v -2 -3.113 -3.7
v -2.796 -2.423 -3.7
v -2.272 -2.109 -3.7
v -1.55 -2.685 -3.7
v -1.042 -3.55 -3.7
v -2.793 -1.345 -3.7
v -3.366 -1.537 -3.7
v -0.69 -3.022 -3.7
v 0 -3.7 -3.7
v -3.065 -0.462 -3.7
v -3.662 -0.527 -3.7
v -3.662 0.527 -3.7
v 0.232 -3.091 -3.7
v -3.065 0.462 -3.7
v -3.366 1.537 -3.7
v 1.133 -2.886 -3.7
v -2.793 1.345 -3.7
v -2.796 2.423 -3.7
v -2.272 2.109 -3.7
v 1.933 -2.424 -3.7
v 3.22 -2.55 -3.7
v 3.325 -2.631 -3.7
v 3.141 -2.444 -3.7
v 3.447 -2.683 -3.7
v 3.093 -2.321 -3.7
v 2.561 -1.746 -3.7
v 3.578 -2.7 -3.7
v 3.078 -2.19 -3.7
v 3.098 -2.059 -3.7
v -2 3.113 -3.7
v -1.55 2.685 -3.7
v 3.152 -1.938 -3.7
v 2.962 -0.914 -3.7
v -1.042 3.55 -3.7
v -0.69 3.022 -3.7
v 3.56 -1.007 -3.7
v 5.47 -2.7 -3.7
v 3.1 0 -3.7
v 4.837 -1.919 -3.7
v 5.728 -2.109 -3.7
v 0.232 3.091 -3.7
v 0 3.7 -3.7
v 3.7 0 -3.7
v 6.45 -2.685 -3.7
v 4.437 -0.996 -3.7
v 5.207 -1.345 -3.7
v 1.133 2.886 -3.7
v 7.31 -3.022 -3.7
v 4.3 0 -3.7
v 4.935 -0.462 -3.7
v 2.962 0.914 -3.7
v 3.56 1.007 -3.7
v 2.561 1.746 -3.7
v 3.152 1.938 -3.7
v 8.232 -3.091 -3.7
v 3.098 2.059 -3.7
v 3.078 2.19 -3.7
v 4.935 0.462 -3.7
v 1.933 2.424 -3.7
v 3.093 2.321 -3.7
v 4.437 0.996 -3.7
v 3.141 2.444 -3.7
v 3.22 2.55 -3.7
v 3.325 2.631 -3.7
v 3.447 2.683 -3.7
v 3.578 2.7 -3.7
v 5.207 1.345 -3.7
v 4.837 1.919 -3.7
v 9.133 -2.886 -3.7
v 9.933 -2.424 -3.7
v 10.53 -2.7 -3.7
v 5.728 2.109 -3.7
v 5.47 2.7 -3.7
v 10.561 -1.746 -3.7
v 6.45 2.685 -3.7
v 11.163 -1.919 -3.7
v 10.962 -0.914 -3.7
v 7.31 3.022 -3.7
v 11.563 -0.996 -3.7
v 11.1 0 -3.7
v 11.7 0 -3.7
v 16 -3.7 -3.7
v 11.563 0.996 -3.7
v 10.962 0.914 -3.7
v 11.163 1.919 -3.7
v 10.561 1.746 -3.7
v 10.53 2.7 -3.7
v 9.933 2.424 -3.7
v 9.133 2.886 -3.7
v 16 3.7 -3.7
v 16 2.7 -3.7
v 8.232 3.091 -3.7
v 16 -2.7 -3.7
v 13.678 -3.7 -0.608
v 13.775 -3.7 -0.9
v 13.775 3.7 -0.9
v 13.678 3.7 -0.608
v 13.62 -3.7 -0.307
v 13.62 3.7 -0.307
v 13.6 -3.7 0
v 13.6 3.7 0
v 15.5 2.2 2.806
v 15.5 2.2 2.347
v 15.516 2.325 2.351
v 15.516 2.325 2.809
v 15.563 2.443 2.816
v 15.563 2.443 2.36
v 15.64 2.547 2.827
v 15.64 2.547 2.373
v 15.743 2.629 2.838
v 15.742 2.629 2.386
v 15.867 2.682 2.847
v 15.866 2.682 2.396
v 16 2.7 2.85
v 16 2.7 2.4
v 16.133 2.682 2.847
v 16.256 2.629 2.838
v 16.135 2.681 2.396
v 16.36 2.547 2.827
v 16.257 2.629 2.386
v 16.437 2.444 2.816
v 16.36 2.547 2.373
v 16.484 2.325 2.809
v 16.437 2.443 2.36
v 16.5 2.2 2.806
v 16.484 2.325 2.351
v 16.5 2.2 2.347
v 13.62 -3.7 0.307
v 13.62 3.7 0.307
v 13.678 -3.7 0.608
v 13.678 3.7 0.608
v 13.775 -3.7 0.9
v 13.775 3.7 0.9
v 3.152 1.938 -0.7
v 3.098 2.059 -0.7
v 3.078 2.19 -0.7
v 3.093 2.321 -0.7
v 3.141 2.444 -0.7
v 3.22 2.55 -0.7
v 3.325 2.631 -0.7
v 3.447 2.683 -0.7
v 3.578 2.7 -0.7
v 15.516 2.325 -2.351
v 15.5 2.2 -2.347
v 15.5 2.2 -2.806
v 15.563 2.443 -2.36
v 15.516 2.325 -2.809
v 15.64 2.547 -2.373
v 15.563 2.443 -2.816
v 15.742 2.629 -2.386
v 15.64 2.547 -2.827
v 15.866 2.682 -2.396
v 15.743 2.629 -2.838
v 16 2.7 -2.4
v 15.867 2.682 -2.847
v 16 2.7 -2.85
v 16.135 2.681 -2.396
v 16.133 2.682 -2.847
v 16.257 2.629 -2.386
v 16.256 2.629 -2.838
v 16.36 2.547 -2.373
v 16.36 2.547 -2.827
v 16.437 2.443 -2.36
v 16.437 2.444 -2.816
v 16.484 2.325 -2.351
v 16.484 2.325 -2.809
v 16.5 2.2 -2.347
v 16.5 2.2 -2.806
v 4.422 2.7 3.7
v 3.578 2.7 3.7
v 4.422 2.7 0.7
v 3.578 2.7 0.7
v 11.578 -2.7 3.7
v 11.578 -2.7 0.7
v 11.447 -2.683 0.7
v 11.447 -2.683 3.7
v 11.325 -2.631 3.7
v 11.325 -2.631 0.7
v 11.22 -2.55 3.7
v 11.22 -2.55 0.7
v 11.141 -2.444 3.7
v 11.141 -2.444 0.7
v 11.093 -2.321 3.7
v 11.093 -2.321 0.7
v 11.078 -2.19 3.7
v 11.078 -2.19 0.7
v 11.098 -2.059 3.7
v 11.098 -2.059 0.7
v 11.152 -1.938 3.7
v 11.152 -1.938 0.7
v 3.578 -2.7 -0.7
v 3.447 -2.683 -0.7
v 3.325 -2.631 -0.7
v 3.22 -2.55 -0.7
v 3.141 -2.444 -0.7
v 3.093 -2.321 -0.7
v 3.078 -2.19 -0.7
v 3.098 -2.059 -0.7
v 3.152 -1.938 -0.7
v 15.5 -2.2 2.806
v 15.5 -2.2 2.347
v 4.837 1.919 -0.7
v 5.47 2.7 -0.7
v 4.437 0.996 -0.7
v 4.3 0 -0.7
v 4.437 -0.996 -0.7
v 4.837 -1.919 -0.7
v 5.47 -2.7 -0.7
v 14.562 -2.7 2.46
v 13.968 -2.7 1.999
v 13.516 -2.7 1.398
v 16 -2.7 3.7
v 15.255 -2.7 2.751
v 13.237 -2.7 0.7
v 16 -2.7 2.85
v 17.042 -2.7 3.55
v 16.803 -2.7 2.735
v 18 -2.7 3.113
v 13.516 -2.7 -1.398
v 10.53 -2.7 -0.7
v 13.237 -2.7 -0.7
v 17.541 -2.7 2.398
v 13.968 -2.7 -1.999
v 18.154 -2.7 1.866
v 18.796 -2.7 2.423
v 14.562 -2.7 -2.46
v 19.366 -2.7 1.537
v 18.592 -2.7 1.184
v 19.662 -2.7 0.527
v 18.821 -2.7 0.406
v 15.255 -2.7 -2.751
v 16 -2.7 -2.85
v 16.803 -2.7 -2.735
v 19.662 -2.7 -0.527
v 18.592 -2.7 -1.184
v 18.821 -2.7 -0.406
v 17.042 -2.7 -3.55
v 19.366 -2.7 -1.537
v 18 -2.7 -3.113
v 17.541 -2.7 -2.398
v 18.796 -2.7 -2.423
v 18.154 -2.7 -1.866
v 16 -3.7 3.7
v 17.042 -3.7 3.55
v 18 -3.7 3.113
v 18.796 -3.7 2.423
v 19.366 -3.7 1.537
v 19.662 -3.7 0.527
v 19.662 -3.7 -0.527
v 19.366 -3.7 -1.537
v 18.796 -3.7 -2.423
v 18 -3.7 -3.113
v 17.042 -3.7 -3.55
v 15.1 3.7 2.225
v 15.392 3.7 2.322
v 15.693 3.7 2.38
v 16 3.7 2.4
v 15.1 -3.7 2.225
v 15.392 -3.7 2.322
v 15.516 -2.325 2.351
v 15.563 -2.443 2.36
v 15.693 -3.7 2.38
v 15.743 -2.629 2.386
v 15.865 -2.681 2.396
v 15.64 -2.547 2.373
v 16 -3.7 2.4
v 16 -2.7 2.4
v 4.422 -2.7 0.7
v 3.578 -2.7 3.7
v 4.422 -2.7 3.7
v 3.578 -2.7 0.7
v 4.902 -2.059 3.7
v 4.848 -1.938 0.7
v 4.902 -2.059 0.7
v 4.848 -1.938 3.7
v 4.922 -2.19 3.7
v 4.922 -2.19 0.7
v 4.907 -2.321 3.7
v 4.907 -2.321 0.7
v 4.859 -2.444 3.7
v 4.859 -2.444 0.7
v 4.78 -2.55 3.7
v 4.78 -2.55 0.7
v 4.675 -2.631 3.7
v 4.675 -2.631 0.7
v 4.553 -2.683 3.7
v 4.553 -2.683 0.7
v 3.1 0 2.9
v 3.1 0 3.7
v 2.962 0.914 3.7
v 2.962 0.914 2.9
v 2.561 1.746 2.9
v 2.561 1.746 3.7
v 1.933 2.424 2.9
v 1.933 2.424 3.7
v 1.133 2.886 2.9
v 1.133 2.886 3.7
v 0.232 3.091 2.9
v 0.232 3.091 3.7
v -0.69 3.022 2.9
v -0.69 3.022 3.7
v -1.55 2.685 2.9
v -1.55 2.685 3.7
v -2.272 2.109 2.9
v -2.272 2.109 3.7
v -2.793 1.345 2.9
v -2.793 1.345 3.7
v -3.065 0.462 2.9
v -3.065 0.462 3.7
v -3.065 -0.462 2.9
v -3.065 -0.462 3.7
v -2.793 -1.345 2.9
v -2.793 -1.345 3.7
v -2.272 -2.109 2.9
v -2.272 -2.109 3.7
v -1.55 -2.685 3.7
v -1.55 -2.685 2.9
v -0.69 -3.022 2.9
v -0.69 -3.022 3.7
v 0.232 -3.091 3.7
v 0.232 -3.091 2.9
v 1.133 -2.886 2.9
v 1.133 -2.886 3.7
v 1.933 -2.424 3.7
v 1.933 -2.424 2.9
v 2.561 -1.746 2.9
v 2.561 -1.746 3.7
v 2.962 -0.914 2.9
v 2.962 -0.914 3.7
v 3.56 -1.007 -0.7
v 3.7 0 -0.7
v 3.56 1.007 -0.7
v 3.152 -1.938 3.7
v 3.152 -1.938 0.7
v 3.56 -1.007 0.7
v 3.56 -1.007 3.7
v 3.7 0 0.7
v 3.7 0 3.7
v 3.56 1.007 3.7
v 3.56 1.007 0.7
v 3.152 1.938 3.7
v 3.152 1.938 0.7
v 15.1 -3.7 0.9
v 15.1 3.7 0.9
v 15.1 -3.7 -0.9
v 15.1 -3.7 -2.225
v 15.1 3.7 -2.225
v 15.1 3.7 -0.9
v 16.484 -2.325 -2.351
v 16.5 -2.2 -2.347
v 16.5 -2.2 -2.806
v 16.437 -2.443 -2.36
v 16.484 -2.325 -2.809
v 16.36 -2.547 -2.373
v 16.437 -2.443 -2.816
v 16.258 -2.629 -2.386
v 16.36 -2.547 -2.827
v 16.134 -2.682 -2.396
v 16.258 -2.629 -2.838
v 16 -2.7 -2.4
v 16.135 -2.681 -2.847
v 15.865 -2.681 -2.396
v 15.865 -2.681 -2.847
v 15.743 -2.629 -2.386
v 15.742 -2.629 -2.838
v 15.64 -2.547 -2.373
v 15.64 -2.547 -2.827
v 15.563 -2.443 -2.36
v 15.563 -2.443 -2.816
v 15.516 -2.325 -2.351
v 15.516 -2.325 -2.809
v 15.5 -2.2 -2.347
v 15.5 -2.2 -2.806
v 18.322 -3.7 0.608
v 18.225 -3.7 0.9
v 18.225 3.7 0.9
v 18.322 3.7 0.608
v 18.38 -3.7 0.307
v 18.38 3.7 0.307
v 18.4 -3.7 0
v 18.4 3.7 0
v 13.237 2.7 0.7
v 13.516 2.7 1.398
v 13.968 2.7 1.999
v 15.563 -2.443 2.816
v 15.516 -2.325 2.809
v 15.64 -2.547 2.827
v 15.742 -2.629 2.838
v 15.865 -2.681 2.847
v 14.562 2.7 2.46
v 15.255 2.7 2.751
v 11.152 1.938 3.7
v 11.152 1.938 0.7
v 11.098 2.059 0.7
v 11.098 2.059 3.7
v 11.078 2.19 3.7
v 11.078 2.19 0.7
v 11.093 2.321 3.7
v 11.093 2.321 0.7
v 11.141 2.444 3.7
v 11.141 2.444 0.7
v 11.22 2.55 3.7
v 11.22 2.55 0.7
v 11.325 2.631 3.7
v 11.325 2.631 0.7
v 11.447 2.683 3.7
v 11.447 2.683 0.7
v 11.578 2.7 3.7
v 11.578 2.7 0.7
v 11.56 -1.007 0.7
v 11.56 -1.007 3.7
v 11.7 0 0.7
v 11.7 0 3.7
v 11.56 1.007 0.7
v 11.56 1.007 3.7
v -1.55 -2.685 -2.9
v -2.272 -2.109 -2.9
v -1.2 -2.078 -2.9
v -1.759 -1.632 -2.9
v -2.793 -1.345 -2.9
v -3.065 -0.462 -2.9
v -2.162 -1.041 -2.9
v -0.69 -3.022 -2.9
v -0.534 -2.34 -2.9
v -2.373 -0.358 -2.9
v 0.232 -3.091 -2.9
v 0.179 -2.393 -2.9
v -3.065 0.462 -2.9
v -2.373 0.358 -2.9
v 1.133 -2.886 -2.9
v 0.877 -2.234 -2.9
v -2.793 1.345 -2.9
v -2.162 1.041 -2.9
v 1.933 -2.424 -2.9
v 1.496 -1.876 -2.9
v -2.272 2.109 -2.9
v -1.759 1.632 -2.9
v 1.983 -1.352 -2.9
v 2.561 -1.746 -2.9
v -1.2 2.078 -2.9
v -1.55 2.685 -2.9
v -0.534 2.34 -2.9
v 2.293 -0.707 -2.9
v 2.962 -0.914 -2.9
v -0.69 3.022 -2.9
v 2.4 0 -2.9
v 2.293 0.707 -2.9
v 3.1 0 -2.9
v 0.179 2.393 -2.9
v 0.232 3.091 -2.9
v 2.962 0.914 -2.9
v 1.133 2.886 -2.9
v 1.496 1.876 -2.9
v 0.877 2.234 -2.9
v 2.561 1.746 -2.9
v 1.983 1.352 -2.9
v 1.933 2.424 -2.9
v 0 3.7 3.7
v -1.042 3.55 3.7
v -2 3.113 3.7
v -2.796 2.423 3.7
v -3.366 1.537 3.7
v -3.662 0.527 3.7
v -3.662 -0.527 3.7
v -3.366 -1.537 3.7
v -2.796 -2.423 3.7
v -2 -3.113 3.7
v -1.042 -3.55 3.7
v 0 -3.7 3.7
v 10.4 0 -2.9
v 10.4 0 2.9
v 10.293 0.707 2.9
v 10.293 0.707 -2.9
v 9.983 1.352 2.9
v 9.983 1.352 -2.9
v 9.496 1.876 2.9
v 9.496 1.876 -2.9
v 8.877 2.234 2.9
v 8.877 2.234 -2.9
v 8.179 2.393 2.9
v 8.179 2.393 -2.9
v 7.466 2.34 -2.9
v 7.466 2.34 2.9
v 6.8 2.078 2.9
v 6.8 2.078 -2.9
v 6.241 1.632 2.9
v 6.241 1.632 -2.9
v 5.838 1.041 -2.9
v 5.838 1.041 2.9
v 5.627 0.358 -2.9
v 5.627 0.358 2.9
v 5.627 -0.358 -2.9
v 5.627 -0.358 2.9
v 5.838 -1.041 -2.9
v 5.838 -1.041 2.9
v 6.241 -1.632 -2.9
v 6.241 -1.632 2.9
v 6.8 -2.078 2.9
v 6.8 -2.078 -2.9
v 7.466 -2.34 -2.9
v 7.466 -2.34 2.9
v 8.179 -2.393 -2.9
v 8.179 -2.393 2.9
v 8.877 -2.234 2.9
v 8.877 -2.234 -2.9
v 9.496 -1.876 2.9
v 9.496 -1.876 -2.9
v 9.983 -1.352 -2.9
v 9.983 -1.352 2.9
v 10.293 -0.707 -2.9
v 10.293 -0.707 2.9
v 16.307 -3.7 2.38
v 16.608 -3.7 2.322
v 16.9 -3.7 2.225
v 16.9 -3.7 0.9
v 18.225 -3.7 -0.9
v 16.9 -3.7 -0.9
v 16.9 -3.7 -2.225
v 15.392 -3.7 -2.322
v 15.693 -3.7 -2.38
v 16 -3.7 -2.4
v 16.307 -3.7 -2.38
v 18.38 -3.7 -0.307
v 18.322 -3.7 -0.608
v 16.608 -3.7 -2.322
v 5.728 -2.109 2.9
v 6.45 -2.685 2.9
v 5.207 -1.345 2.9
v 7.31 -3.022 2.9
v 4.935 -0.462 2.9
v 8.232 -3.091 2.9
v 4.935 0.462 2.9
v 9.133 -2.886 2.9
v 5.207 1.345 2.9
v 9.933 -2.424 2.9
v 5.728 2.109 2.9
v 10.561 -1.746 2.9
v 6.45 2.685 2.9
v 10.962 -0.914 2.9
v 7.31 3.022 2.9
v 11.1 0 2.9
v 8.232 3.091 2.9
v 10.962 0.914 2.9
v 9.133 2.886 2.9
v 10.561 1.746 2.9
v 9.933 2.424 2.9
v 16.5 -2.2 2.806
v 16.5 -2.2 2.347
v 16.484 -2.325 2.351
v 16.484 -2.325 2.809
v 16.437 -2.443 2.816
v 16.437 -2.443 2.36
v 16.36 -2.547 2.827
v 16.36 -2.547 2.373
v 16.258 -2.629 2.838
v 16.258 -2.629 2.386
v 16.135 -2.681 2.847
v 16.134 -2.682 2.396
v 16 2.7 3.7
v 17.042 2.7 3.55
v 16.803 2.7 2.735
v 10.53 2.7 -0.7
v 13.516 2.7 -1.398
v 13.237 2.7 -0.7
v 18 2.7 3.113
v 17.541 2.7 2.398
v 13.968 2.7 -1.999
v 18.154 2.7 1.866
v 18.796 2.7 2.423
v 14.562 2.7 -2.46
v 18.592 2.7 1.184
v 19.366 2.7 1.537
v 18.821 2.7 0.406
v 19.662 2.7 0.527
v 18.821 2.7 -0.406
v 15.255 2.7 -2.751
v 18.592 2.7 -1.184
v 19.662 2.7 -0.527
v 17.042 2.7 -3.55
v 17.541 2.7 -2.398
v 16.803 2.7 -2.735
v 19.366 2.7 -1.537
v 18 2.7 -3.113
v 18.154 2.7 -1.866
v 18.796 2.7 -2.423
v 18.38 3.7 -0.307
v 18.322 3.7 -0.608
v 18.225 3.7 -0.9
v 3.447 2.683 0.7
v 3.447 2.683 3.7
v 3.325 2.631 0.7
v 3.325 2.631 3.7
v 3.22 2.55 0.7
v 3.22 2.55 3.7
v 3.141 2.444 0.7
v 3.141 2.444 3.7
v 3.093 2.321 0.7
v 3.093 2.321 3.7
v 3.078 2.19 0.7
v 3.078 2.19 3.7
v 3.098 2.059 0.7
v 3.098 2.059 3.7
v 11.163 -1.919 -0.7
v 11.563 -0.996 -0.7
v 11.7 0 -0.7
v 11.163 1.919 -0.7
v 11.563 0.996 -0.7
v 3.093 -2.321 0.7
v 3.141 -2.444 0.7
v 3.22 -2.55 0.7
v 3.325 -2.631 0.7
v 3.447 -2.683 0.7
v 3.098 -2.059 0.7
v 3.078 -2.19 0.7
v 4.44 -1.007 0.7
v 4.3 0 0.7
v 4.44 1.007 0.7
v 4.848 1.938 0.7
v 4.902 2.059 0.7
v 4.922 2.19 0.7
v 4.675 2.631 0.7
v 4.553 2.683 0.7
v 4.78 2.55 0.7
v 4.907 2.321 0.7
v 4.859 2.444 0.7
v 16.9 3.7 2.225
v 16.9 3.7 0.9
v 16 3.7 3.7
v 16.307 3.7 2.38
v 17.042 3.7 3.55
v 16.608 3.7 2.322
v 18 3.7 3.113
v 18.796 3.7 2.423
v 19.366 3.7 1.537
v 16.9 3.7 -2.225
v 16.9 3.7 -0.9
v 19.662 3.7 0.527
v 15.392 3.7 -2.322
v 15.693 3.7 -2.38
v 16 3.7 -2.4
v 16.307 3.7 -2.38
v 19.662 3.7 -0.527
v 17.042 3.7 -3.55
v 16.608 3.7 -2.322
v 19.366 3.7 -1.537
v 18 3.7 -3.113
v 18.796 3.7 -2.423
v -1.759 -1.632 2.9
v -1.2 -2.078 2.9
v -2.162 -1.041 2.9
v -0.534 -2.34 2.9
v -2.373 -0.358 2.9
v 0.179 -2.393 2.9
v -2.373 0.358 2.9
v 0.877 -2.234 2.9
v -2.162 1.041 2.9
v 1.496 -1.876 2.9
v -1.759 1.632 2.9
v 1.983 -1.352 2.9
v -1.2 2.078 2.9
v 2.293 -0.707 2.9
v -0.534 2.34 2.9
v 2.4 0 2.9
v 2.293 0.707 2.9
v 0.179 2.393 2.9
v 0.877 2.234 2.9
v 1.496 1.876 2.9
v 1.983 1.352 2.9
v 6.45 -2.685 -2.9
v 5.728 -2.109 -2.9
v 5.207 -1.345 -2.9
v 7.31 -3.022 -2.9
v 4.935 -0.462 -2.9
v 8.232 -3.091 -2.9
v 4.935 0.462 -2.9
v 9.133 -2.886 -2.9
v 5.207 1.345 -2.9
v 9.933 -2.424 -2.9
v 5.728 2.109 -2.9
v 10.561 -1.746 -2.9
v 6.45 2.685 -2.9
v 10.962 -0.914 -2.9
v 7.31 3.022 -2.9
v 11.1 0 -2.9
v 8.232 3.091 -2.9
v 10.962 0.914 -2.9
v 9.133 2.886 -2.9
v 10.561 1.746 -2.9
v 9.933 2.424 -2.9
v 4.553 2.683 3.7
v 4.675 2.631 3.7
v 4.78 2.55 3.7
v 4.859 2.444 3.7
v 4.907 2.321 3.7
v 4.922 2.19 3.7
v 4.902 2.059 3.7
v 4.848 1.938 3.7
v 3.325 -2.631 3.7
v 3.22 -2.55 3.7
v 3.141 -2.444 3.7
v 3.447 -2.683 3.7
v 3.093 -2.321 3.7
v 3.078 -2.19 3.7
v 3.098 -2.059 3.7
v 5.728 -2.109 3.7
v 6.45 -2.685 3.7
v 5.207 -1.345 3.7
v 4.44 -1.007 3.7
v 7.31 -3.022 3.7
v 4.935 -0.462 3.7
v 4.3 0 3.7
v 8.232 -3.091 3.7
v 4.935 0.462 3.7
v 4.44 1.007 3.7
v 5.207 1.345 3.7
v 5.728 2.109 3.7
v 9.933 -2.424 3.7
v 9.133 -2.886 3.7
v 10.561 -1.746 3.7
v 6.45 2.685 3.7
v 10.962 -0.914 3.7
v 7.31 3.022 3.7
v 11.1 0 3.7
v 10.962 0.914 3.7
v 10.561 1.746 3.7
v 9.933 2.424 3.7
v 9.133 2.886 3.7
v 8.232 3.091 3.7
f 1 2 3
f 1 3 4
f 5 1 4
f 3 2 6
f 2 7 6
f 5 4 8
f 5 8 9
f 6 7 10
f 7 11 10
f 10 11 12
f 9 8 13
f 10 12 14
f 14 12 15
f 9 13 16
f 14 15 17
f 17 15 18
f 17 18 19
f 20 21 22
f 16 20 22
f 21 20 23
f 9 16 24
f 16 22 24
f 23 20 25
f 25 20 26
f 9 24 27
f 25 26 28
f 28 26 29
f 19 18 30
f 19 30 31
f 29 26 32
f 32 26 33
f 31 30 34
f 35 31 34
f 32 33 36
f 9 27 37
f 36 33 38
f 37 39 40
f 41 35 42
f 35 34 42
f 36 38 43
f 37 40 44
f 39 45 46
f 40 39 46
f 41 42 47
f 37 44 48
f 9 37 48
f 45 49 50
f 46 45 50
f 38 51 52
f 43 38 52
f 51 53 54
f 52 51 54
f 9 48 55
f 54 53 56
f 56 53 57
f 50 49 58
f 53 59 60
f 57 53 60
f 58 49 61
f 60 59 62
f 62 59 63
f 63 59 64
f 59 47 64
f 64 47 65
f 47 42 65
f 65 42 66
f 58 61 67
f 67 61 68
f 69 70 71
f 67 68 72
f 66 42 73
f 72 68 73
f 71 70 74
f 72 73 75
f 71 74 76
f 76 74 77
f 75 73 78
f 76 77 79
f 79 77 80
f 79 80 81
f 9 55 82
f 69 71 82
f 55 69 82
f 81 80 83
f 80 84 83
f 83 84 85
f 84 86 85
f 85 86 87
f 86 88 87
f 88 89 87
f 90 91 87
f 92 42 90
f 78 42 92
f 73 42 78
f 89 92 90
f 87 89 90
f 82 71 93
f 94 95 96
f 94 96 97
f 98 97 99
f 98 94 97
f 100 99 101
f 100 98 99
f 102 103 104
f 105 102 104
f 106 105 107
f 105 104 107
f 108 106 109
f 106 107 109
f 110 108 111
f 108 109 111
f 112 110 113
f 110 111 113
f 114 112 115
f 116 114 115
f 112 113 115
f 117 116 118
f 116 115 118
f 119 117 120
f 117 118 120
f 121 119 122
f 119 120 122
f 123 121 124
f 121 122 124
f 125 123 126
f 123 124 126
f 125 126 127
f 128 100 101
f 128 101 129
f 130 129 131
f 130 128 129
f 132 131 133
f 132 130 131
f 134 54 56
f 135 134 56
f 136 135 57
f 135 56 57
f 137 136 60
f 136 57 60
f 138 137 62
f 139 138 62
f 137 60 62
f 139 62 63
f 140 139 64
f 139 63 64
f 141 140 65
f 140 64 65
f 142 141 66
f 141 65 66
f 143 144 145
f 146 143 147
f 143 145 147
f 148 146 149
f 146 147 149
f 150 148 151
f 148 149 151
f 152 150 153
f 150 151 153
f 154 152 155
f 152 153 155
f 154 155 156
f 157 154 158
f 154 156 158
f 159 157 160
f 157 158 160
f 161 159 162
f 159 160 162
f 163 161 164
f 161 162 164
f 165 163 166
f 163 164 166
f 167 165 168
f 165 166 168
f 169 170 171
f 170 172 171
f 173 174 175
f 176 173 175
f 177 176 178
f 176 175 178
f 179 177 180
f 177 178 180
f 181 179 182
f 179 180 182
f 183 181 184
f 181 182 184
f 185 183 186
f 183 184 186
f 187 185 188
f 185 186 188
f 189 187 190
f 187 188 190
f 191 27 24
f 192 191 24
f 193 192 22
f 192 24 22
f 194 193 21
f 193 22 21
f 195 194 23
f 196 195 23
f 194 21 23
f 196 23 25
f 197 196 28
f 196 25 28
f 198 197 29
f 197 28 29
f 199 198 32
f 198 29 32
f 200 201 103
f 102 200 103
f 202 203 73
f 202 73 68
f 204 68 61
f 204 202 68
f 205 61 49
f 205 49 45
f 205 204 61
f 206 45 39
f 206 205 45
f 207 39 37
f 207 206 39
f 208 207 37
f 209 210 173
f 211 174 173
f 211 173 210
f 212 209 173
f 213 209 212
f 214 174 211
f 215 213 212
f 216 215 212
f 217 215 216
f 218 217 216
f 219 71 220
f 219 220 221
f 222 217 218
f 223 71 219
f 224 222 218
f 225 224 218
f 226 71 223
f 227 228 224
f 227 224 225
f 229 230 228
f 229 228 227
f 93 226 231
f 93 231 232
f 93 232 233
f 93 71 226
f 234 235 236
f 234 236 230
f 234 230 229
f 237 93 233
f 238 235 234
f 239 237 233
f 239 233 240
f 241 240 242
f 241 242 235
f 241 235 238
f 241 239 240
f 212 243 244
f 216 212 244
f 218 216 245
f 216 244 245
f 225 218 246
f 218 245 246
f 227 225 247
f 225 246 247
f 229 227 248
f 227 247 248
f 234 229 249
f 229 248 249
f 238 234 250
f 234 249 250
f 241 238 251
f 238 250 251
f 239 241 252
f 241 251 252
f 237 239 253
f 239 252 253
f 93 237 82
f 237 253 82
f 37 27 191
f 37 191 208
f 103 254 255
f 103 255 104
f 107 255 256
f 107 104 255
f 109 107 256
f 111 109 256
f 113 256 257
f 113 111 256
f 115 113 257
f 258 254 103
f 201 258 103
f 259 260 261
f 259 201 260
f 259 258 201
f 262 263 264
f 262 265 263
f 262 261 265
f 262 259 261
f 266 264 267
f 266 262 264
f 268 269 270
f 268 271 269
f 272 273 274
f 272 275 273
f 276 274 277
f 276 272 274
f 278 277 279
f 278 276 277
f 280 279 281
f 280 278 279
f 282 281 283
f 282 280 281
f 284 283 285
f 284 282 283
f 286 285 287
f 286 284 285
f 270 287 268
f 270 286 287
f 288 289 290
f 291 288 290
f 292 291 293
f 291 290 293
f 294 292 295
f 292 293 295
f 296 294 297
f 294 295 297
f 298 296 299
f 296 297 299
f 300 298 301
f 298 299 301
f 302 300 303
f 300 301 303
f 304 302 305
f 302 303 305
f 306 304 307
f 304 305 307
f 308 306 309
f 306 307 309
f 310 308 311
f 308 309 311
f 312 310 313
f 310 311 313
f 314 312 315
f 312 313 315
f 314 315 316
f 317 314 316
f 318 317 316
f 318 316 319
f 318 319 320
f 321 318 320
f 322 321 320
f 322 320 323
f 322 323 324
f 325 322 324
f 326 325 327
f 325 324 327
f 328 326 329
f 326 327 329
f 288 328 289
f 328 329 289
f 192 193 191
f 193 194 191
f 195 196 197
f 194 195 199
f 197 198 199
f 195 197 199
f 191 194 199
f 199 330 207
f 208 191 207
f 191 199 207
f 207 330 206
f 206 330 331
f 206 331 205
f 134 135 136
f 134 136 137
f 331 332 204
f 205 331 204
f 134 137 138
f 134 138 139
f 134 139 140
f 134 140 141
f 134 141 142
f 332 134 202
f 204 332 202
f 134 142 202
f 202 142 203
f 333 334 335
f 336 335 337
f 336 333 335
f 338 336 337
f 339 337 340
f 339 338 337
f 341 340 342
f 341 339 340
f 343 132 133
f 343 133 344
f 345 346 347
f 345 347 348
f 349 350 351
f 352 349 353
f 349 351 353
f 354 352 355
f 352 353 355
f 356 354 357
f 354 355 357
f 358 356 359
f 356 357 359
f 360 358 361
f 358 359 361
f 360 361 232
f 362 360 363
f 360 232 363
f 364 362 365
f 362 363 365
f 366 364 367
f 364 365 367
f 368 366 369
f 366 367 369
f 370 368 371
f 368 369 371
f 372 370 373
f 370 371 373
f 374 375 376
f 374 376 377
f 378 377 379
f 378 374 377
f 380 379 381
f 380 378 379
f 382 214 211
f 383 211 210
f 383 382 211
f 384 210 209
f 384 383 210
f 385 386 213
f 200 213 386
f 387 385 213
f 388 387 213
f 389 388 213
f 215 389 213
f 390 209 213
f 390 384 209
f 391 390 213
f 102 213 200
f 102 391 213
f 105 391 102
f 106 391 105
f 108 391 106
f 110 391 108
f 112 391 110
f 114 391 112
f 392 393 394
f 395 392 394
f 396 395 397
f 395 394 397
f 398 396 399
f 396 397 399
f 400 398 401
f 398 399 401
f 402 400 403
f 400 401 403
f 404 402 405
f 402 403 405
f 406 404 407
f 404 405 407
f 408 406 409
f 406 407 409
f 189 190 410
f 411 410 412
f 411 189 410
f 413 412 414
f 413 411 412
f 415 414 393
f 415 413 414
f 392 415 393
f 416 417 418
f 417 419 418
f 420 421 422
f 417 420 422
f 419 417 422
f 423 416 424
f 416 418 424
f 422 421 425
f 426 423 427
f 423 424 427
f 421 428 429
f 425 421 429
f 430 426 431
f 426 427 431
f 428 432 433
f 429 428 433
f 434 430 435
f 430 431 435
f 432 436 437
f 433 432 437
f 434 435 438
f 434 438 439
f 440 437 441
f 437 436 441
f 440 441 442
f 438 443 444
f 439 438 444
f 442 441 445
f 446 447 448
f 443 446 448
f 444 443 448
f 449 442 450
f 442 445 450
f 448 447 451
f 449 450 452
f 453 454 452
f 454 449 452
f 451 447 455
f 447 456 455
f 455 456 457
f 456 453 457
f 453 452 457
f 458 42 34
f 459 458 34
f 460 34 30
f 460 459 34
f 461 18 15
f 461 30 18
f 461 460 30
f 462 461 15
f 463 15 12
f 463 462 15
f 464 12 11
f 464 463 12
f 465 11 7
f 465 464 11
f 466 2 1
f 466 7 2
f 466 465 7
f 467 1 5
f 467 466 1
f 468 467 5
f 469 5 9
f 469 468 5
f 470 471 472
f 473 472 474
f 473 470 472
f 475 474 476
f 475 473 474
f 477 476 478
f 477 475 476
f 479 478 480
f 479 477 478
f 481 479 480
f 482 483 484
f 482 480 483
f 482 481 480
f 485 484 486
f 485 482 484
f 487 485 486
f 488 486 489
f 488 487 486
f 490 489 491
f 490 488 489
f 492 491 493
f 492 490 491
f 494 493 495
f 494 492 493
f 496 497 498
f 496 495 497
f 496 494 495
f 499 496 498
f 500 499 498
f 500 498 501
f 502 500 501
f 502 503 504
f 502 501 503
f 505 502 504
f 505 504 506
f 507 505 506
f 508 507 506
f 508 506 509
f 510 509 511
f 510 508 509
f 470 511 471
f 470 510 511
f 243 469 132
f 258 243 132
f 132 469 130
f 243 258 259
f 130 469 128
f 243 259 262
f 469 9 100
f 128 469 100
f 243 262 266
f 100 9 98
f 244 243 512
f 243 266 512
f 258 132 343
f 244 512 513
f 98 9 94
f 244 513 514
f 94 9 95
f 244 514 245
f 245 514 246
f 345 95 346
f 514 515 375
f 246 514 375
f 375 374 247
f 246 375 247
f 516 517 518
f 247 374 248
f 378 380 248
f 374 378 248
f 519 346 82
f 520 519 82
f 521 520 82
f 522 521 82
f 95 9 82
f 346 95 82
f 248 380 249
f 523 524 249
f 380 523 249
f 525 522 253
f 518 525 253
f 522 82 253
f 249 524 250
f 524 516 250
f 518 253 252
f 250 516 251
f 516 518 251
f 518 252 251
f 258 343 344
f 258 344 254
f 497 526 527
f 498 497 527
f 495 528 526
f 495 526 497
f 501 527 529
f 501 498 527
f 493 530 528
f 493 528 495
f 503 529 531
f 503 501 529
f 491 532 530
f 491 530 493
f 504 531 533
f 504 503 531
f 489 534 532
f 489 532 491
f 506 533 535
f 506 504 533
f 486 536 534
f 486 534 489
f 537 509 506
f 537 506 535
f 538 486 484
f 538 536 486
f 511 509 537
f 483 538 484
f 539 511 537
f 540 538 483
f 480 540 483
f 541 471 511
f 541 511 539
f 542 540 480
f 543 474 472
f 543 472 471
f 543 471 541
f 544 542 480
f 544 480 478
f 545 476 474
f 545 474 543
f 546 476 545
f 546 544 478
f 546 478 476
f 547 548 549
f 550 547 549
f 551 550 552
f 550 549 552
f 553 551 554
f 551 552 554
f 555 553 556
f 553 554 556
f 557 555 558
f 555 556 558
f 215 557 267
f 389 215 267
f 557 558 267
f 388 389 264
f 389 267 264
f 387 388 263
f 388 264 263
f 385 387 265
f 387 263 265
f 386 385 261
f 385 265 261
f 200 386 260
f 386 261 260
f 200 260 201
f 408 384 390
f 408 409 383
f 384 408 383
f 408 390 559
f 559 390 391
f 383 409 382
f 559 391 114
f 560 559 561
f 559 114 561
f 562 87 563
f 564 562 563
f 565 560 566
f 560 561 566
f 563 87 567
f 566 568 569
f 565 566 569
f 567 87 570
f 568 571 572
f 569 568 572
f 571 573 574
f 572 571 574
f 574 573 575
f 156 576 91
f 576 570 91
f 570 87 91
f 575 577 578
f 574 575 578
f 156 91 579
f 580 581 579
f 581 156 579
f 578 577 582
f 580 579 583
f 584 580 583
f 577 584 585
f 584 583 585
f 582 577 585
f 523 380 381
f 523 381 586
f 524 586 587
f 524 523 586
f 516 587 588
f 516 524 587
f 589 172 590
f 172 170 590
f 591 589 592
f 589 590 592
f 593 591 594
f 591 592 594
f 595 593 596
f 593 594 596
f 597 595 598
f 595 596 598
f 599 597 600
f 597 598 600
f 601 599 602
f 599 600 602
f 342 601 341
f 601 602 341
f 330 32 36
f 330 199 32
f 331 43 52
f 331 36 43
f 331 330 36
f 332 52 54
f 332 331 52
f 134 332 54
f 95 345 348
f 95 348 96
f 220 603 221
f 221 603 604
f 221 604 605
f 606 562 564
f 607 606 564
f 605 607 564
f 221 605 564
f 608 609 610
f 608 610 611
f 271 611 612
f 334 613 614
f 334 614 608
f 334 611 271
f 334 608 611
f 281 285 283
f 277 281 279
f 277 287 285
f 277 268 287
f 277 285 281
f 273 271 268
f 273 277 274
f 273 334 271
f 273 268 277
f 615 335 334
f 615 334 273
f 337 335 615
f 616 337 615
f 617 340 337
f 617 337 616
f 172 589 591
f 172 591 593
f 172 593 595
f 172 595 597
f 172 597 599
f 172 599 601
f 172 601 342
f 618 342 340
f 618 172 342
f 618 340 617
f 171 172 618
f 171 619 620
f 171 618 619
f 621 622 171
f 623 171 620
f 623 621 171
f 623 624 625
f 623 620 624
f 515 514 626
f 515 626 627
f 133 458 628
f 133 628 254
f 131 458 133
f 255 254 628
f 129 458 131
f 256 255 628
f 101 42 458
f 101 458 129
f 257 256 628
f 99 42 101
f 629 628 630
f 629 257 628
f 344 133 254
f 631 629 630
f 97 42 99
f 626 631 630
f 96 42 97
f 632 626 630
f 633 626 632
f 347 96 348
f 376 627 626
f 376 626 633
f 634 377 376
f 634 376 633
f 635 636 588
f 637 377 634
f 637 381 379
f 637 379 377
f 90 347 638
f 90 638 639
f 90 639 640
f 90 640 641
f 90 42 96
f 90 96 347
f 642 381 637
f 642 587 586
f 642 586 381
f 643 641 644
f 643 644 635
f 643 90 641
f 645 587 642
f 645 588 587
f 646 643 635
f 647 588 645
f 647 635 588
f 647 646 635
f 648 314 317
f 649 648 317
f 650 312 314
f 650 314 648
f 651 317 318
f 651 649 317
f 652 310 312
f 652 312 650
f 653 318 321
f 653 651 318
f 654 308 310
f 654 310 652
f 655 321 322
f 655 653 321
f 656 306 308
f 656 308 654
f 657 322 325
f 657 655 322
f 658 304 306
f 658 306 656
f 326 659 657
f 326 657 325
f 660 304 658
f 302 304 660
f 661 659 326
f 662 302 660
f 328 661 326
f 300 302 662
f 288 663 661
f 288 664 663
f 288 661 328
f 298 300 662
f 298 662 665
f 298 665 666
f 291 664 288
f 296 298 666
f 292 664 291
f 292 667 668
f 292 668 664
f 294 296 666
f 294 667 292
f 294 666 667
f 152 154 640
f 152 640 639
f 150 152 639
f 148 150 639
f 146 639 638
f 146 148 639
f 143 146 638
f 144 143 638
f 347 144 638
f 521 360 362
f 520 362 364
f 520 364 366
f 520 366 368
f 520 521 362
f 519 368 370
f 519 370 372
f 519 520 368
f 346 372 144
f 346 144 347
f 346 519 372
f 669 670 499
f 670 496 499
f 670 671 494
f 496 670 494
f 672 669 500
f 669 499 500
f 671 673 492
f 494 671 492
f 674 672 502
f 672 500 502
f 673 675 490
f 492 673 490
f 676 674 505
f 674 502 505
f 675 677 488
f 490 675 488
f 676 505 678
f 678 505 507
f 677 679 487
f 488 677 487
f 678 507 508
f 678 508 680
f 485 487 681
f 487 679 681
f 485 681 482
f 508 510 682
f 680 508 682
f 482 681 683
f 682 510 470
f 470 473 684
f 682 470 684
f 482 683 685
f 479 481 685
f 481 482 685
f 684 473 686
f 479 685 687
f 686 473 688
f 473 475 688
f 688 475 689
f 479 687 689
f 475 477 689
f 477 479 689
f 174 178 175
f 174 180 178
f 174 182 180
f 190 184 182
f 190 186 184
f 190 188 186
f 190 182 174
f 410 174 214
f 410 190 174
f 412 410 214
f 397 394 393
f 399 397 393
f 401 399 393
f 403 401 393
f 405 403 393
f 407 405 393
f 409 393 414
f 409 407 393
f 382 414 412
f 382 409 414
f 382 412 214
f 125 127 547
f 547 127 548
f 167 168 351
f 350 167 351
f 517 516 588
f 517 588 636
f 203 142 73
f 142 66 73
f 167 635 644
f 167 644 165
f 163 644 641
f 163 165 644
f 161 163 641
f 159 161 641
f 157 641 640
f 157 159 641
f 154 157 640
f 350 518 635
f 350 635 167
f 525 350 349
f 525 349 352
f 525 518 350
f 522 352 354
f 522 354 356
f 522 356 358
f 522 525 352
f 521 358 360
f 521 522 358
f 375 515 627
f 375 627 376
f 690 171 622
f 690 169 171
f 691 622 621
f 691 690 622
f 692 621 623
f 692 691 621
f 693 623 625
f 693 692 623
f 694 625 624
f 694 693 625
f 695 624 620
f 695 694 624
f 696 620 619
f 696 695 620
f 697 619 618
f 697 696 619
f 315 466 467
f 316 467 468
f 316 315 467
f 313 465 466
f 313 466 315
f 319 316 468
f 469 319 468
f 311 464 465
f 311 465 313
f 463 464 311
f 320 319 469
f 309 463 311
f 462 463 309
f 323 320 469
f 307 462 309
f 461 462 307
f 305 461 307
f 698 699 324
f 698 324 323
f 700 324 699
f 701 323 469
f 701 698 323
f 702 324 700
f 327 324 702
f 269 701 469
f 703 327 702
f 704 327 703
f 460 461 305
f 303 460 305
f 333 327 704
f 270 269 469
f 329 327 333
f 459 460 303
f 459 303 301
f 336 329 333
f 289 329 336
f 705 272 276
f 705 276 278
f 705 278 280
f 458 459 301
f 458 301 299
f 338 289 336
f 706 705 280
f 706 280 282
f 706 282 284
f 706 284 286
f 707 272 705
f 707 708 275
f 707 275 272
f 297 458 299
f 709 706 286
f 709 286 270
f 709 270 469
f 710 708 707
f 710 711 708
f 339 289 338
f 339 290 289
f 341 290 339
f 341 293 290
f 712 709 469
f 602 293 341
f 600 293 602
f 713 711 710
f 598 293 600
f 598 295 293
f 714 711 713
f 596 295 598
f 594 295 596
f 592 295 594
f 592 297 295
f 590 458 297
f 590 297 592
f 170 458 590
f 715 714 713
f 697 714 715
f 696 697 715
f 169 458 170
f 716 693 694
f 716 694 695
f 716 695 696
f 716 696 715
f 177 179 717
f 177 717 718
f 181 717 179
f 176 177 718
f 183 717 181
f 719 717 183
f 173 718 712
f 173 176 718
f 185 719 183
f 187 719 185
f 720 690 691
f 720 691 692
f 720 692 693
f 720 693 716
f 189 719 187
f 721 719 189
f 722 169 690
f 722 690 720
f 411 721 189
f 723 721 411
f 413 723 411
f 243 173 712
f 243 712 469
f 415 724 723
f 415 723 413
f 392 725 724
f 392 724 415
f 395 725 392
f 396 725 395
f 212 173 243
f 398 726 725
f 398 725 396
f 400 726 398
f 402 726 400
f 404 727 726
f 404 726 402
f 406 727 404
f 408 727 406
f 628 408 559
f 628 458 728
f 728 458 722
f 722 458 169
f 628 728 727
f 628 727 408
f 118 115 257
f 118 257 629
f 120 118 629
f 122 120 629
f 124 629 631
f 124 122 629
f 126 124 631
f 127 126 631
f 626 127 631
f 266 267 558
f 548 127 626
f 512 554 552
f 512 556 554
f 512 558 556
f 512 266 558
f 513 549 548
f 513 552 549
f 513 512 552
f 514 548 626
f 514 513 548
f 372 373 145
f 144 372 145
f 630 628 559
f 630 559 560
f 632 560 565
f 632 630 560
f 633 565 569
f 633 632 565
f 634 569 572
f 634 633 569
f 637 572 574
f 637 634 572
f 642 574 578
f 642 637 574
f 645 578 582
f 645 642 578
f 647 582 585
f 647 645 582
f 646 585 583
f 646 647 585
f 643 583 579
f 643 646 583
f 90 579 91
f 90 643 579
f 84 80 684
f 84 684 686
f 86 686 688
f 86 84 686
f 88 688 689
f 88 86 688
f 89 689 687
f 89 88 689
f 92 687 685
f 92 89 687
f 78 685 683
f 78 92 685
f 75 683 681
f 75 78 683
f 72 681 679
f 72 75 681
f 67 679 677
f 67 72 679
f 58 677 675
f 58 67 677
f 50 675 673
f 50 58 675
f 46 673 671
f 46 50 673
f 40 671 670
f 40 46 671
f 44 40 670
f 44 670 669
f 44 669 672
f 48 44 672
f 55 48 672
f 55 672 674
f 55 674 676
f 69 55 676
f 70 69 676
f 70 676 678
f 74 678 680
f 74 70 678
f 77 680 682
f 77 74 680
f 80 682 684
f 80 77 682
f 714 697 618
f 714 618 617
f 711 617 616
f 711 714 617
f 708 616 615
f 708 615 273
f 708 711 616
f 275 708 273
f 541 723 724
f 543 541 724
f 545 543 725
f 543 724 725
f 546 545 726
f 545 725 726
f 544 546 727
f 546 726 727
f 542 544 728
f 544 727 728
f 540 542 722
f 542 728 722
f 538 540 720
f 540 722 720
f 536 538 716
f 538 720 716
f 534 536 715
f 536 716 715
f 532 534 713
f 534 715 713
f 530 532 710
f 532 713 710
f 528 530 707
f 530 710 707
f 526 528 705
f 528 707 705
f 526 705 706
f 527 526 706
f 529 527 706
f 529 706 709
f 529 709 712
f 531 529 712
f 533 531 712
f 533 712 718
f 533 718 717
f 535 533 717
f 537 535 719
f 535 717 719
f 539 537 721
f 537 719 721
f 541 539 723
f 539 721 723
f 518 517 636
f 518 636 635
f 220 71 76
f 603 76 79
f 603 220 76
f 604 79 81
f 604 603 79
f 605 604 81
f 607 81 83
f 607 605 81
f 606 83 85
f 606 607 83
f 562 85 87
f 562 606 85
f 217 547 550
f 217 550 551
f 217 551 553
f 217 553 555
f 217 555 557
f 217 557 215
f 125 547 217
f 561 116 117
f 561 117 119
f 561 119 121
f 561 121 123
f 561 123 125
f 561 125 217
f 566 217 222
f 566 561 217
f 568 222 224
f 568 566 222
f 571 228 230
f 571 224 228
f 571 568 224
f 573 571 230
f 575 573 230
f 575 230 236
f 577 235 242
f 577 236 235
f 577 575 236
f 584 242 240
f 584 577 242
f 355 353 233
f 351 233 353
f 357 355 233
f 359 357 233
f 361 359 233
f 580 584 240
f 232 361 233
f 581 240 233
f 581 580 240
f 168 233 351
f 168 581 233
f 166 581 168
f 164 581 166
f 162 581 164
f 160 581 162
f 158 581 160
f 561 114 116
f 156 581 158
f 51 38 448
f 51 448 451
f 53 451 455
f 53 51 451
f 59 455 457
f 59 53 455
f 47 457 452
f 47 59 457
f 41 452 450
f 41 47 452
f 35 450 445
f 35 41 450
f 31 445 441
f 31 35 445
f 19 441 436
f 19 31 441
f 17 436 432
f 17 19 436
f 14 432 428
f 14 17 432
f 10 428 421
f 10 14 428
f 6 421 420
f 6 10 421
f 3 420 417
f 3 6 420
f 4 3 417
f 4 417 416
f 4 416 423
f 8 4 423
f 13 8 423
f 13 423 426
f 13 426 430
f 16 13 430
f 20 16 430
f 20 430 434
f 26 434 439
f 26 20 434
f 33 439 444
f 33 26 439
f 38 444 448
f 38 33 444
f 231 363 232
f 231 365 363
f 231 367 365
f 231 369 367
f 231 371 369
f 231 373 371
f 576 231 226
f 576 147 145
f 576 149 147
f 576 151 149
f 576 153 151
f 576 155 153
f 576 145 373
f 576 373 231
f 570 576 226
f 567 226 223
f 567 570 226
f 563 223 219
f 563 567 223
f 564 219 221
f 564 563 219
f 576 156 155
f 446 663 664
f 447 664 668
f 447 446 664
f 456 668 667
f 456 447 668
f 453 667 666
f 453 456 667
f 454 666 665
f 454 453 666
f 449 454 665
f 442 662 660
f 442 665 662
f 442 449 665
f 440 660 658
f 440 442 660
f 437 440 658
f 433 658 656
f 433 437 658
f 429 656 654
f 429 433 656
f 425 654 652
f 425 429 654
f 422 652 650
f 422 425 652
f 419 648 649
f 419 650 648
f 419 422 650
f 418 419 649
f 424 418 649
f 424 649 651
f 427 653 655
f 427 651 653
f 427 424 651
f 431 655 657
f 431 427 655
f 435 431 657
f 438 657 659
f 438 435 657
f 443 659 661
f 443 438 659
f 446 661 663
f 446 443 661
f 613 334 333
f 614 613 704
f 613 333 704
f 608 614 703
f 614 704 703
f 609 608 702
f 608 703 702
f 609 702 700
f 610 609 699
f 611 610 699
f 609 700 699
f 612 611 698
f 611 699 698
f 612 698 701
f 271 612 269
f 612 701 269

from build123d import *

# Parameters (mm, degrees)
SKETCH1_R                  = 3.7
SKETCH1_R_2                = 2.4
PIN_SIDE_DEPTH             = 3.7
SIDE_START                 = 3.7
SIDE_EAR_DEPTH             = 1
MIDDLE_RIB_DEPTH           = 0.7
SKETCH4_R                  = 2.85
AXLE_BODY_DEPTH            = 3.7
AXLE_CUT_DEPTH             = 21.383081219
AXLE_CUT_DEPTH_BACK        = 21.383081219
SKETCH5_W                  = 1.8
SKETCH5_H                  = 1.8
AXLE_SLOT_DEPTH            = 21.383081219
AXLE_SLOT_DEPTH_BACK       = 21.383081219
SKETCH8_R                  = 3.7
SKETCH8_R_2                = 2.4
SECOND_PIN_BODY_DEPTH      = 3.7
SECOND_PIN_HOLE_DEPTH      = 21.383081238
SECOND_PIN_HOLE_DEPTH_BACK = 21.383081238
SKETCH9_R                  = 2.4
SKETCH7_R                  = 3.1
PIN_RIM_DEPTH              = 0.8
FILLET1_R                  = 0.5
MIRROR2_START              = -3.7
MIRROR2_OUTLINE_R          = 3.1
MIRROR2_OUTLINE_R_2        = 2.4
MIRROR2_DEPTH              = 0.8
MIRROR2_2_DEPTH            = 3
MIRROR2_START_2            = 0.7
MIRROR2_3_DEPTH            = 3


# Read off the part's stored shape, not the designer's step: Mirror2
with BuildPart() as part:
    # Sketch1 → Pin Side (new, symmetric)
    with BuildSketch(Plane.XY):
        Circle(SKETCH1_R)
        Circle(SKETCH1_R_2, mode=Mode.SUBTRACT)
    extrude(amount=PIN_SIDE_DEPTH, both=True)

    # Sketch2 → Side Ear (add)
    with BuildSketch(Plane(origin=(0, 0, 0), x_dir=(1, 0, 0), z_dir=(0, 1, 0)).offset(SIDE_START)):
        with BuildLine():
            Line((0, 3.7), (0, -3.7))
            Line((0, -3.7), (16, -3.7))
            ThreePointArc((16, -3.7), (19.7, 0), (16, 3.7))
            Line((16, 3.7), (0, 3.7))
        make_face()
    side_ear = extrude(amount=-SIDE_EAR_DEPTH)

    # Mirror1: Side Ear across plane
    add(side_ear.mirror(Plane.ZX))

    # Sketch3 → Middle Rib (add, symmetric)
    with BuildSketch(Plane.XY):
        with BuildLine():
            Line((2.529822128, -2.7), (16, -2.7))
            Line((16, -2.7), (16, 2.7))
            Line((16, 2.7), (2.529822128, 2.7))
            ThreePointArc((2.529822128, 2.7), (3.7, 0), (2.529822128, -2.7))
        make_face()
    extrude(amount=MIDDLE_RIB_DEPTH, both=True)

    # Sketch4 → Axle Body (add, symmetric)
    with BuildSketch(Plane(origin=(0, 0, 0), x_dir=(1, 0, 0), z_dir=(0, 1, 0))):
        with Locations((16, 0)):
            Circle(SKETCH4_R)
    extrude(amount=AXLE_BODY_DEPTH, both=True)

    # Sketch5 → Axle Cut (cut, two sides: drawn at the far end of the back side and taken through both)
    with BuildSketch(Plane(origin=(0, 0, 0), x_dir=(1, 0, 0), z_dir=(0, 1, 0)).offset(-AXLE_CUT_DEPTH_BACK)):
        with BuildLine():
            Line((13.775140454, -0.9), (15.1, -0.9))
            Line((15.1, -0.9), (15.1, 0.9))
            Line((15.1, 0.9), (13.775140454, 0.9))
            ThreePointArc((13.775140454, 0.9), (13.644191974, 0.45844143), (13.6, 0))
            ThreePointArc((13.6, 0), (13.644191974, -0.45844143), (13.775140454, -0.9))
        make_face()
        with BuildLine():
            Line((15.1, 0.9), (16.9, 0.9))
            Line((16.9, 0.9), (16.9, 2.224859546))
            ThreePointArc((16.9, 2.224859546), (16.45844143, 2.355808026), (16, 2.4))
            ThreePointArc((16, 2.4), (15.54155857, 2.355808026), (15.1, 2.224859546))
            Line((15.1, 2.224859546), (15.1, 0.9))
        make_face()
        with Locations((16, 0)):
            Rectangle(SKETCH5_W, SKETCH5_H)
        with BuildLine():
            Line((16.9, 0.9), (16.9, -0.9))
            Line((16.9, -0.9), (18.224859546, -0.9))
            ThreePointArc((18.224859546, -0.9), (18.355808026, -0.45844143), (18.4, 0))
            ThreePointArc((18.4, 0), (18.355808026, 0.45844143), (18.224859546, 0.9))
            Line((18.224859546, 0.9), (16.9, 0.9))
        make_face()
        with BuildLine():
            ThreePointArc((15.1, -2.224859546), (15.54155857, -2.355808026), (16, -2.4))
            ThreePointArc((16, -2.4), (16.45844143, -2.355808026), (16.9, -2.224859546))
            Line((16.9, -2.224859546), (16.9, -0.9))
            Line((16.9, -0.9), (15.1, -0.9))
            Line((15.1, -0.9), (15.1, -2.224859546))
        make_face()
    extrude(amount=AXLE_CUT_DEPTH + AXLE_CUT_DEPTH_BACK, mode=Mode.SUBTRACT)

    # Sketch6 → Axle Slot (cut, two sides: drawn at the far end of the back side and taken through both)
    with BuildSketch(Plane.XY.offset(-AXLE_SLOT_DEPTH_BACK)):
        with BuildLine():
            Line((15.5, -2.2), (15.5, 2.2))
            ThreePointArc((15.5, 2.2), (16, 2.7), (16.5, 2.2))
            Line((16.5, 2.2), (16.5, -2.2))
            ThreePointArc((16.5, -2.2), (16, -2.7), (15.5, -2.2))
        make_face()
    extrude(amount=AXLE_SLOT_DEPTH + AXLE_SLOT_DEPTH_BACK, mode=Mode.SUBTRACT)

    # Sketch8 → Second Pin Body (add, symmetric)
    with BuildSketch(Plane.XY):
        with Locations((8, 0)):
            Circle(SKETCH8_R)
        with Locations((8, 0)):
            Circle(SKETCH8_R_2, mode=Mode.SUBTRACT)
    extrude(amount=SECOND_PIN_BODY_DEPTH, both=True)

    # Sketch9 → Second Pin Hole (cut, two sides: drawn at the far end of the back side and taken through both)
    with BuildSketch(Plane.XY.offset(-SECOND_PIN_HOLE_DEPTH_BACK)):
        with Locations((8, 0)):
            Circle(SKETCH9_R)
    extrude(amount=SECOND_PIN_HOLE_DEPTH + SECOND_PIN_HOLE_DEPTH_BACK, mode=Mode.SUBTRACT)

    # Sketch7 → Pin Rim (cut)
    with BuildSketch(Plane.XY.offset(3.7)):
        Circle(SKETCH7_R)
        with Locations((8, 0)):
            Circle(SKETCH7_R)
    extrude(amount=-PIN_RIM_DEPTH, mode=Mode.SUBTRACT)

    # Fillet1
    fillet1_edges = [part.edges().sort_by_distance(p)[0] for p in [
        (5.470177872, -2.7, 2.2),
        (5.470177872, 2.7, 2.2),
        (2.529822128, -2.7, 2.2),
        (2.529822128, 2.7, 2.2),
    ]]
    fillet(fillet1_edges, radius=FILLET1_R)

    # Mirror2 outline → Mirror2 (cut)
    # profile 1 of 2: a face of its own
    with BuildSketch(Plane.XY.offset(MIRROR2_START)):
        with Locations((8, 0)):
            Circle(MIRROR2_OUTLINE_R)
        with Locations((8, 0)):
            Circle(MIRROR2_OUTLINE_R_2, mode=Mode.SUBTRACT)
    # profile 2 of 2: a face of its own
    with BuildSketch(Plane.XY.offset(MIRROR2_START)):
        Circle(MIRROR2_OUTLINE_R)
        Circle(MIRROR2_OUTLINE_R_2, mode=Mode.SUBTRACT)
    extrude(amount=MIRROR2_DEPTH, mode=Mode.SUBTRACT)

    # Mirror2 2 outline → Mirror2 2 (add)
    with BuildSketch(Plane.XY.offset(MIRROR2_START)):
        with BuildLine():
            ThreePointArc((2.529822128, 2.7), (2.86623565, 2.33980623), (3.151791054, 1.938095238))
            ThreePointArc((3.151791054, 1.938095238), (3.141272984, 2.443975018), (3.577708764, 2.7))
            Line((3.577708764, 2.7), (2.529822128, 2.7))
        make_face()
        with BuildLine():
            ThreePointArc((3.577708764, -2.7), (3.141272984, -2.443975018), (3.151791054, -1.938095238))
            ThreePointArc((3.151791054, -1.938095238), (2.86623565, -2.33980623), (2.529822128, -2.7))
            Line((2.529822128, -2.7), (3.577708764, -2.7))
        make_face()
    extrude(amount=MIRROR2_2_DEPTH)

    # Mirror2 3 outline → Mirror2 3 (add)
    with BuildSketch(Plane.XY.offset(MIRROR2_START_2)):
        with BuildLine():
            ThreePointArc((10.529822128, 2.7), (10.86623565, 2.33980623), (11.151791054, 1.938095238))
            ThreePointArc((11.151791054, 1.938095238), (11.141272984, 2.443975018), (11.577708764, 2.7))
            Line((11.577708764, 2.7), (10.529822128, 2.7))
        make_face()
        with BuildLine():
            ThreePointArc((11.577708764, -2.7), (11.141272984, -2.443975018), (11.151791054, -1.938095238))
            ThreePointArc((11.151791054, -1.938095238), (10.86623565, -2.33980623), (10.529822128, -2.7))
            Line((10.529822128, -2.7), (11.577708764, -2.7))
        make_face()
    extrude(amount=MIRROR2_3_DEPTH)


solid = part.part
